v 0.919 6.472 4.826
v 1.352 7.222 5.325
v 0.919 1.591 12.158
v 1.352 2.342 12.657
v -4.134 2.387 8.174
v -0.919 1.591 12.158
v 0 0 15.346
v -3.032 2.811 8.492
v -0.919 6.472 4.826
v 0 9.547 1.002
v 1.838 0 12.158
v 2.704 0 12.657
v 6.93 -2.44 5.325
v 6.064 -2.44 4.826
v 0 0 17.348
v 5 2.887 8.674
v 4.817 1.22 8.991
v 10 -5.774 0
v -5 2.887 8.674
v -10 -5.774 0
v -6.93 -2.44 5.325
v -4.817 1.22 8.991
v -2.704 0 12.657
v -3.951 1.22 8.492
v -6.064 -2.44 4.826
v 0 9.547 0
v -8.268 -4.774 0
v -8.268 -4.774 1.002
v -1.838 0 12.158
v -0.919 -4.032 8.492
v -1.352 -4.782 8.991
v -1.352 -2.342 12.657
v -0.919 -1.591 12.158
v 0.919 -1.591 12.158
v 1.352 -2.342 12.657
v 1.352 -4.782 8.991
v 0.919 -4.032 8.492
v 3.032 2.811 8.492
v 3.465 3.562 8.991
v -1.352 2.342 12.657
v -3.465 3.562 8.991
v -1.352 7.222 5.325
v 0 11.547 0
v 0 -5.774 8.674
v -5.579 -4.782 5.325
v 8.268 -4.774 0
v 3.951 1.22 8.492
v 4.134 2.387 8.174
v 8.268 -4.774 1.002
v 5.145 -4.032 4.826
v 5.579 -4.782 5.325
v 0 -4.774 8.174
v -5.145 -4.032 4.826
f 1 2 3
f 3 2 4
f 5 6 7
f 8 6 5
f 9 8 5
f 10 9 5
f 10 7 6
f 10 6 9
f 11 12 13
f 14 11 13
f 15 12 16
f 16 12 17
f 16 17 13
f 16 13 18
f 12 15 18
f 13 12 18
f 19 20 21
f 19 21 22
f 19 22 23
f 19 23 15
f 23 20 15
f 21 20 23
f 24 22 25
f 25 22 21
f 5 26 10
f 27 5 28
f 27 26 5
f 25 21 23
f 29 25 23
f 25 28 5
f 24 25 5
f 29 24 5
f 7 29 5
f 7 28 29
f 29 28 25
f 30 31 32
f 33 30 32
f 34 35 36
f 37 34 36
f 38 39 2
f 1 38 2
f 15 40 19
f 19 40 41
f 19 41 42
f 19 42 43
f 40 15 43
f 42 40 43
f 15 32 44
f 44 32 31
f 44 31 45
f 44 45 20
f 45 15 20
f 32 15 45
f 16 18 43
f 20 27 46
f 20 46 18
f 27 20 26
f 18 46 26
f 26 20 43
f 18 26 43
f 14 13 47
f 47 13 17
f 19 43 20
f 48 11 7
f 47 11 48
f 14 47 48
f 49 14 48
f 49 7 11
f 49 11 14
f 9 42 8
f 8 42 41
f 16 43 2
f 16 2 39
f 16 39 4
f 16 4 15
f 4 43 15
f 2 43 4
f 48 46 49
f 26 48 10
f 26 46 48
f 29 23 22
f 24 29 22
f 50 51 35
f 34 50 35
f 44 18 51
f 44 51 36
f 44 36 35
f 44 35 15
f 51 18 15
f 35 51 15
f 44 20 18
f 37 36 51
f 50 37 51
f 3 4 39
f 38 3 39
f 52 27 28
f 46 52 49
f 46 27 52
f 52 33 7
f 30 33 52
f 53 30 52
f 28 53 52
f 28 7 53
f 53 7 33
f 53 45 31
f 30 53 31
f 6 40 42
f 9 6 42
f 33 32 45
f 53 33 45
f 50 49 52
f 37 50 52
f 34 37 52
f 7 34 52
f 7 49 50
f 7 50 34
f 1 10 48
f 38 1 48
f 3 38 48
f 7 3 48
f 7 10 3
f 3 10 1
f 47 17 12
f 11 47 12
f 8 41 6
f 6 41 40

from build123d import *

# Parameters (mm, degrees)
F1_DEPTH  = 17.3482
F3_DEPTH  = 17.3215080757
F5_DEPTH  = 17.3215080757
F7_DEPTH  = 17.3215080757
F8_T      = -1
F10_DEPTH = 1
F12_DEPTH = 1
F14_DEPTH = 1
F16_DEPTH = 1
F18_DEPTH = 1
F20_DEPTH = 1


with BuildPart() as f1:
    # F0 (on Top) → F1 (new body)
    with BuildSketch(Plane.XY):
        Polygon((0, 11.5470053838), (-10, -5.7735026919), (10, -5.7735026919), align=None)
    extrude(amount=F1_DEPTH)

    # F2 (on face) → F3 (cut, through all)
    with BuildSketch(Plane(origin=(-5, 2.8867513459, 0), x_dir=(-0.5, -0.8660254038, 0), z_dir=(-0.8660254038, 0.5, 0))):
        Polygon((-10, 17.3482), (-10, 0), (0, 17.3482), align=None)
        Polygon((10, 17.3482), (0, 17.3482), (10, 0), align=None)
    extrude(amount=-F3_DEPTH, mode=Mode.SUBTRACT)

    # F4 (on face) → F5 (cut, through all)
    with BuildSketch(Plane.XZ.offset(5.7735026919)):
        Polygon((-10, 17.3482), (-10, 0), (0, 17.3482), align=None)
        Polygon((10, 17.3482), (0, 17.3482), (10, 0), align=None)
    extrude(amount=-F5_DEPTH, mode=Mode.SUBTRACT)

    # F6 (on face) → F7 (cut, through all)
    with BuildSketch(Plane(origin=(5, 2.8867513459, 0), x_dir=(-0.5, 0.8660254038, 0), z_dir=(0.8660254038, 0.5, 0))):
        Polygon((-10, 17.3482), (-10, 0), (0, 17.3482), align=None)
        Polygon((10, 17.3482), (0, 17.3482), (10, 0), align=None)
    extrude(amount=-F7_DEPTH, mode=Mode.SUBTRACT)

    # F8
    f8_openings = [f1.faces().sort_by_distance(p)[0] for p in [
        (0, 0, 0),
    ]]
    offset(amount=F8_T, openings=f8_openings)

    # F9 (on face) → F10 (cut, through all)
    with BuildSketch(Plane(origin=(7.5059859034, 0, 4.326665535), x_dir=(0, 1, 0), z_dir=(0.8663709312, 0, 0.4994010509))):
        Polygon((-2.4401965598, 1.1524346291), (1.2200982799, 5.3840480932), (0, 9.6156615572), align=None)
    extrude(amount=-F10_DEPTH, mode=Mode.SUBTRACT)

    # F11 (on face) → F12 (cut, through all)
    with BuildSketch(Plane(origin=(3.7529929517, -6.5003744728, 4.326665535), x_dir=(0.9013048055, 0.3606091099, -0.240022327), z_dir=(0.4331854656, -0.7502992355, 0.4994010509))):
        Polygon((-2.6639553332, 9.2392796887), (-2.6639553332, 4.835282377), (2.0254065744, 1.7833656477), align=None)
    extrude(amount=-F12_DEPTH, mode=Mode.SUBTRACT)

    # F13 (on face) → F14 (cut, through all)
    with BuildSketch(Plane(origin=(-3.7529929517, -6.5003744728, 4.326665535), x_dir=(0.9013048055, -0.3606091099, 0.240022327), z_dir=(-0.4331854656, -0.7502992355, 0.4994010509))):
        Polygon((2.6639553332, 9.2392796887), (-2.0254065744, 1.7833656477), (2.6639553332, 4.835282377), align=None)
    extrude(amount=-F14_DEPTH, mode=Mode.SUBTRACT)

    # F15 (on face) → F16 (cut, through all)
    with BuildSketch(Plane(origin=(-7.5059859034, 0, 4.326665535), x_dir=(0, -1, 0), z_dir=(-0.8663709312, 0, 0.4994010509))):
        Polygon((-1.2200982799, 5.3840480932), (2.4401965598, 1.1524346291), (0, 9.6156615572), align=None)
    extrude(amount=-F16_DEPTH, mode=Mode.SUBTRACT)

    # F17 (on face) → F18 (cut, through all)
    with BuildSketch(Plane(origin=(3.7529929517, 6.5003744728, 4.326665535), x_dir=(-0.9013048055, 0.3606091099, 0.240022327), z_dir=(0.4331854656, 0.7502992355, 0.4994010509))):
        Polygon((2.6639553332, 9.2392796887), (0.3192743794, 5.5113226682), (2.6639553332, 0.4312850652), align=None)
    extrude(amount=-F18_DEPTH, mode=Mode.SUBTRACT)

    # F19 (on face) → F20 (cut, through all)
    with BuildSketch(Plane(origin=(-3.7529929517, 6.5003744728, 4.326665535), x_dir=(-0.9013048055, -0.3606091099, -0.240022327), z_dir=(-0.4331854656, 0.7502992355, 0.4994010509))):
        Polygon((-2.6639553332, 9.2392796887), (-2.6639553332, 0.4312850652), (-0.3192743794, 5.5113226682), align=None)
    extrude(amount=-F20_DEPTH, mode=Mode.SUBTRACT)


solid = f1.part
